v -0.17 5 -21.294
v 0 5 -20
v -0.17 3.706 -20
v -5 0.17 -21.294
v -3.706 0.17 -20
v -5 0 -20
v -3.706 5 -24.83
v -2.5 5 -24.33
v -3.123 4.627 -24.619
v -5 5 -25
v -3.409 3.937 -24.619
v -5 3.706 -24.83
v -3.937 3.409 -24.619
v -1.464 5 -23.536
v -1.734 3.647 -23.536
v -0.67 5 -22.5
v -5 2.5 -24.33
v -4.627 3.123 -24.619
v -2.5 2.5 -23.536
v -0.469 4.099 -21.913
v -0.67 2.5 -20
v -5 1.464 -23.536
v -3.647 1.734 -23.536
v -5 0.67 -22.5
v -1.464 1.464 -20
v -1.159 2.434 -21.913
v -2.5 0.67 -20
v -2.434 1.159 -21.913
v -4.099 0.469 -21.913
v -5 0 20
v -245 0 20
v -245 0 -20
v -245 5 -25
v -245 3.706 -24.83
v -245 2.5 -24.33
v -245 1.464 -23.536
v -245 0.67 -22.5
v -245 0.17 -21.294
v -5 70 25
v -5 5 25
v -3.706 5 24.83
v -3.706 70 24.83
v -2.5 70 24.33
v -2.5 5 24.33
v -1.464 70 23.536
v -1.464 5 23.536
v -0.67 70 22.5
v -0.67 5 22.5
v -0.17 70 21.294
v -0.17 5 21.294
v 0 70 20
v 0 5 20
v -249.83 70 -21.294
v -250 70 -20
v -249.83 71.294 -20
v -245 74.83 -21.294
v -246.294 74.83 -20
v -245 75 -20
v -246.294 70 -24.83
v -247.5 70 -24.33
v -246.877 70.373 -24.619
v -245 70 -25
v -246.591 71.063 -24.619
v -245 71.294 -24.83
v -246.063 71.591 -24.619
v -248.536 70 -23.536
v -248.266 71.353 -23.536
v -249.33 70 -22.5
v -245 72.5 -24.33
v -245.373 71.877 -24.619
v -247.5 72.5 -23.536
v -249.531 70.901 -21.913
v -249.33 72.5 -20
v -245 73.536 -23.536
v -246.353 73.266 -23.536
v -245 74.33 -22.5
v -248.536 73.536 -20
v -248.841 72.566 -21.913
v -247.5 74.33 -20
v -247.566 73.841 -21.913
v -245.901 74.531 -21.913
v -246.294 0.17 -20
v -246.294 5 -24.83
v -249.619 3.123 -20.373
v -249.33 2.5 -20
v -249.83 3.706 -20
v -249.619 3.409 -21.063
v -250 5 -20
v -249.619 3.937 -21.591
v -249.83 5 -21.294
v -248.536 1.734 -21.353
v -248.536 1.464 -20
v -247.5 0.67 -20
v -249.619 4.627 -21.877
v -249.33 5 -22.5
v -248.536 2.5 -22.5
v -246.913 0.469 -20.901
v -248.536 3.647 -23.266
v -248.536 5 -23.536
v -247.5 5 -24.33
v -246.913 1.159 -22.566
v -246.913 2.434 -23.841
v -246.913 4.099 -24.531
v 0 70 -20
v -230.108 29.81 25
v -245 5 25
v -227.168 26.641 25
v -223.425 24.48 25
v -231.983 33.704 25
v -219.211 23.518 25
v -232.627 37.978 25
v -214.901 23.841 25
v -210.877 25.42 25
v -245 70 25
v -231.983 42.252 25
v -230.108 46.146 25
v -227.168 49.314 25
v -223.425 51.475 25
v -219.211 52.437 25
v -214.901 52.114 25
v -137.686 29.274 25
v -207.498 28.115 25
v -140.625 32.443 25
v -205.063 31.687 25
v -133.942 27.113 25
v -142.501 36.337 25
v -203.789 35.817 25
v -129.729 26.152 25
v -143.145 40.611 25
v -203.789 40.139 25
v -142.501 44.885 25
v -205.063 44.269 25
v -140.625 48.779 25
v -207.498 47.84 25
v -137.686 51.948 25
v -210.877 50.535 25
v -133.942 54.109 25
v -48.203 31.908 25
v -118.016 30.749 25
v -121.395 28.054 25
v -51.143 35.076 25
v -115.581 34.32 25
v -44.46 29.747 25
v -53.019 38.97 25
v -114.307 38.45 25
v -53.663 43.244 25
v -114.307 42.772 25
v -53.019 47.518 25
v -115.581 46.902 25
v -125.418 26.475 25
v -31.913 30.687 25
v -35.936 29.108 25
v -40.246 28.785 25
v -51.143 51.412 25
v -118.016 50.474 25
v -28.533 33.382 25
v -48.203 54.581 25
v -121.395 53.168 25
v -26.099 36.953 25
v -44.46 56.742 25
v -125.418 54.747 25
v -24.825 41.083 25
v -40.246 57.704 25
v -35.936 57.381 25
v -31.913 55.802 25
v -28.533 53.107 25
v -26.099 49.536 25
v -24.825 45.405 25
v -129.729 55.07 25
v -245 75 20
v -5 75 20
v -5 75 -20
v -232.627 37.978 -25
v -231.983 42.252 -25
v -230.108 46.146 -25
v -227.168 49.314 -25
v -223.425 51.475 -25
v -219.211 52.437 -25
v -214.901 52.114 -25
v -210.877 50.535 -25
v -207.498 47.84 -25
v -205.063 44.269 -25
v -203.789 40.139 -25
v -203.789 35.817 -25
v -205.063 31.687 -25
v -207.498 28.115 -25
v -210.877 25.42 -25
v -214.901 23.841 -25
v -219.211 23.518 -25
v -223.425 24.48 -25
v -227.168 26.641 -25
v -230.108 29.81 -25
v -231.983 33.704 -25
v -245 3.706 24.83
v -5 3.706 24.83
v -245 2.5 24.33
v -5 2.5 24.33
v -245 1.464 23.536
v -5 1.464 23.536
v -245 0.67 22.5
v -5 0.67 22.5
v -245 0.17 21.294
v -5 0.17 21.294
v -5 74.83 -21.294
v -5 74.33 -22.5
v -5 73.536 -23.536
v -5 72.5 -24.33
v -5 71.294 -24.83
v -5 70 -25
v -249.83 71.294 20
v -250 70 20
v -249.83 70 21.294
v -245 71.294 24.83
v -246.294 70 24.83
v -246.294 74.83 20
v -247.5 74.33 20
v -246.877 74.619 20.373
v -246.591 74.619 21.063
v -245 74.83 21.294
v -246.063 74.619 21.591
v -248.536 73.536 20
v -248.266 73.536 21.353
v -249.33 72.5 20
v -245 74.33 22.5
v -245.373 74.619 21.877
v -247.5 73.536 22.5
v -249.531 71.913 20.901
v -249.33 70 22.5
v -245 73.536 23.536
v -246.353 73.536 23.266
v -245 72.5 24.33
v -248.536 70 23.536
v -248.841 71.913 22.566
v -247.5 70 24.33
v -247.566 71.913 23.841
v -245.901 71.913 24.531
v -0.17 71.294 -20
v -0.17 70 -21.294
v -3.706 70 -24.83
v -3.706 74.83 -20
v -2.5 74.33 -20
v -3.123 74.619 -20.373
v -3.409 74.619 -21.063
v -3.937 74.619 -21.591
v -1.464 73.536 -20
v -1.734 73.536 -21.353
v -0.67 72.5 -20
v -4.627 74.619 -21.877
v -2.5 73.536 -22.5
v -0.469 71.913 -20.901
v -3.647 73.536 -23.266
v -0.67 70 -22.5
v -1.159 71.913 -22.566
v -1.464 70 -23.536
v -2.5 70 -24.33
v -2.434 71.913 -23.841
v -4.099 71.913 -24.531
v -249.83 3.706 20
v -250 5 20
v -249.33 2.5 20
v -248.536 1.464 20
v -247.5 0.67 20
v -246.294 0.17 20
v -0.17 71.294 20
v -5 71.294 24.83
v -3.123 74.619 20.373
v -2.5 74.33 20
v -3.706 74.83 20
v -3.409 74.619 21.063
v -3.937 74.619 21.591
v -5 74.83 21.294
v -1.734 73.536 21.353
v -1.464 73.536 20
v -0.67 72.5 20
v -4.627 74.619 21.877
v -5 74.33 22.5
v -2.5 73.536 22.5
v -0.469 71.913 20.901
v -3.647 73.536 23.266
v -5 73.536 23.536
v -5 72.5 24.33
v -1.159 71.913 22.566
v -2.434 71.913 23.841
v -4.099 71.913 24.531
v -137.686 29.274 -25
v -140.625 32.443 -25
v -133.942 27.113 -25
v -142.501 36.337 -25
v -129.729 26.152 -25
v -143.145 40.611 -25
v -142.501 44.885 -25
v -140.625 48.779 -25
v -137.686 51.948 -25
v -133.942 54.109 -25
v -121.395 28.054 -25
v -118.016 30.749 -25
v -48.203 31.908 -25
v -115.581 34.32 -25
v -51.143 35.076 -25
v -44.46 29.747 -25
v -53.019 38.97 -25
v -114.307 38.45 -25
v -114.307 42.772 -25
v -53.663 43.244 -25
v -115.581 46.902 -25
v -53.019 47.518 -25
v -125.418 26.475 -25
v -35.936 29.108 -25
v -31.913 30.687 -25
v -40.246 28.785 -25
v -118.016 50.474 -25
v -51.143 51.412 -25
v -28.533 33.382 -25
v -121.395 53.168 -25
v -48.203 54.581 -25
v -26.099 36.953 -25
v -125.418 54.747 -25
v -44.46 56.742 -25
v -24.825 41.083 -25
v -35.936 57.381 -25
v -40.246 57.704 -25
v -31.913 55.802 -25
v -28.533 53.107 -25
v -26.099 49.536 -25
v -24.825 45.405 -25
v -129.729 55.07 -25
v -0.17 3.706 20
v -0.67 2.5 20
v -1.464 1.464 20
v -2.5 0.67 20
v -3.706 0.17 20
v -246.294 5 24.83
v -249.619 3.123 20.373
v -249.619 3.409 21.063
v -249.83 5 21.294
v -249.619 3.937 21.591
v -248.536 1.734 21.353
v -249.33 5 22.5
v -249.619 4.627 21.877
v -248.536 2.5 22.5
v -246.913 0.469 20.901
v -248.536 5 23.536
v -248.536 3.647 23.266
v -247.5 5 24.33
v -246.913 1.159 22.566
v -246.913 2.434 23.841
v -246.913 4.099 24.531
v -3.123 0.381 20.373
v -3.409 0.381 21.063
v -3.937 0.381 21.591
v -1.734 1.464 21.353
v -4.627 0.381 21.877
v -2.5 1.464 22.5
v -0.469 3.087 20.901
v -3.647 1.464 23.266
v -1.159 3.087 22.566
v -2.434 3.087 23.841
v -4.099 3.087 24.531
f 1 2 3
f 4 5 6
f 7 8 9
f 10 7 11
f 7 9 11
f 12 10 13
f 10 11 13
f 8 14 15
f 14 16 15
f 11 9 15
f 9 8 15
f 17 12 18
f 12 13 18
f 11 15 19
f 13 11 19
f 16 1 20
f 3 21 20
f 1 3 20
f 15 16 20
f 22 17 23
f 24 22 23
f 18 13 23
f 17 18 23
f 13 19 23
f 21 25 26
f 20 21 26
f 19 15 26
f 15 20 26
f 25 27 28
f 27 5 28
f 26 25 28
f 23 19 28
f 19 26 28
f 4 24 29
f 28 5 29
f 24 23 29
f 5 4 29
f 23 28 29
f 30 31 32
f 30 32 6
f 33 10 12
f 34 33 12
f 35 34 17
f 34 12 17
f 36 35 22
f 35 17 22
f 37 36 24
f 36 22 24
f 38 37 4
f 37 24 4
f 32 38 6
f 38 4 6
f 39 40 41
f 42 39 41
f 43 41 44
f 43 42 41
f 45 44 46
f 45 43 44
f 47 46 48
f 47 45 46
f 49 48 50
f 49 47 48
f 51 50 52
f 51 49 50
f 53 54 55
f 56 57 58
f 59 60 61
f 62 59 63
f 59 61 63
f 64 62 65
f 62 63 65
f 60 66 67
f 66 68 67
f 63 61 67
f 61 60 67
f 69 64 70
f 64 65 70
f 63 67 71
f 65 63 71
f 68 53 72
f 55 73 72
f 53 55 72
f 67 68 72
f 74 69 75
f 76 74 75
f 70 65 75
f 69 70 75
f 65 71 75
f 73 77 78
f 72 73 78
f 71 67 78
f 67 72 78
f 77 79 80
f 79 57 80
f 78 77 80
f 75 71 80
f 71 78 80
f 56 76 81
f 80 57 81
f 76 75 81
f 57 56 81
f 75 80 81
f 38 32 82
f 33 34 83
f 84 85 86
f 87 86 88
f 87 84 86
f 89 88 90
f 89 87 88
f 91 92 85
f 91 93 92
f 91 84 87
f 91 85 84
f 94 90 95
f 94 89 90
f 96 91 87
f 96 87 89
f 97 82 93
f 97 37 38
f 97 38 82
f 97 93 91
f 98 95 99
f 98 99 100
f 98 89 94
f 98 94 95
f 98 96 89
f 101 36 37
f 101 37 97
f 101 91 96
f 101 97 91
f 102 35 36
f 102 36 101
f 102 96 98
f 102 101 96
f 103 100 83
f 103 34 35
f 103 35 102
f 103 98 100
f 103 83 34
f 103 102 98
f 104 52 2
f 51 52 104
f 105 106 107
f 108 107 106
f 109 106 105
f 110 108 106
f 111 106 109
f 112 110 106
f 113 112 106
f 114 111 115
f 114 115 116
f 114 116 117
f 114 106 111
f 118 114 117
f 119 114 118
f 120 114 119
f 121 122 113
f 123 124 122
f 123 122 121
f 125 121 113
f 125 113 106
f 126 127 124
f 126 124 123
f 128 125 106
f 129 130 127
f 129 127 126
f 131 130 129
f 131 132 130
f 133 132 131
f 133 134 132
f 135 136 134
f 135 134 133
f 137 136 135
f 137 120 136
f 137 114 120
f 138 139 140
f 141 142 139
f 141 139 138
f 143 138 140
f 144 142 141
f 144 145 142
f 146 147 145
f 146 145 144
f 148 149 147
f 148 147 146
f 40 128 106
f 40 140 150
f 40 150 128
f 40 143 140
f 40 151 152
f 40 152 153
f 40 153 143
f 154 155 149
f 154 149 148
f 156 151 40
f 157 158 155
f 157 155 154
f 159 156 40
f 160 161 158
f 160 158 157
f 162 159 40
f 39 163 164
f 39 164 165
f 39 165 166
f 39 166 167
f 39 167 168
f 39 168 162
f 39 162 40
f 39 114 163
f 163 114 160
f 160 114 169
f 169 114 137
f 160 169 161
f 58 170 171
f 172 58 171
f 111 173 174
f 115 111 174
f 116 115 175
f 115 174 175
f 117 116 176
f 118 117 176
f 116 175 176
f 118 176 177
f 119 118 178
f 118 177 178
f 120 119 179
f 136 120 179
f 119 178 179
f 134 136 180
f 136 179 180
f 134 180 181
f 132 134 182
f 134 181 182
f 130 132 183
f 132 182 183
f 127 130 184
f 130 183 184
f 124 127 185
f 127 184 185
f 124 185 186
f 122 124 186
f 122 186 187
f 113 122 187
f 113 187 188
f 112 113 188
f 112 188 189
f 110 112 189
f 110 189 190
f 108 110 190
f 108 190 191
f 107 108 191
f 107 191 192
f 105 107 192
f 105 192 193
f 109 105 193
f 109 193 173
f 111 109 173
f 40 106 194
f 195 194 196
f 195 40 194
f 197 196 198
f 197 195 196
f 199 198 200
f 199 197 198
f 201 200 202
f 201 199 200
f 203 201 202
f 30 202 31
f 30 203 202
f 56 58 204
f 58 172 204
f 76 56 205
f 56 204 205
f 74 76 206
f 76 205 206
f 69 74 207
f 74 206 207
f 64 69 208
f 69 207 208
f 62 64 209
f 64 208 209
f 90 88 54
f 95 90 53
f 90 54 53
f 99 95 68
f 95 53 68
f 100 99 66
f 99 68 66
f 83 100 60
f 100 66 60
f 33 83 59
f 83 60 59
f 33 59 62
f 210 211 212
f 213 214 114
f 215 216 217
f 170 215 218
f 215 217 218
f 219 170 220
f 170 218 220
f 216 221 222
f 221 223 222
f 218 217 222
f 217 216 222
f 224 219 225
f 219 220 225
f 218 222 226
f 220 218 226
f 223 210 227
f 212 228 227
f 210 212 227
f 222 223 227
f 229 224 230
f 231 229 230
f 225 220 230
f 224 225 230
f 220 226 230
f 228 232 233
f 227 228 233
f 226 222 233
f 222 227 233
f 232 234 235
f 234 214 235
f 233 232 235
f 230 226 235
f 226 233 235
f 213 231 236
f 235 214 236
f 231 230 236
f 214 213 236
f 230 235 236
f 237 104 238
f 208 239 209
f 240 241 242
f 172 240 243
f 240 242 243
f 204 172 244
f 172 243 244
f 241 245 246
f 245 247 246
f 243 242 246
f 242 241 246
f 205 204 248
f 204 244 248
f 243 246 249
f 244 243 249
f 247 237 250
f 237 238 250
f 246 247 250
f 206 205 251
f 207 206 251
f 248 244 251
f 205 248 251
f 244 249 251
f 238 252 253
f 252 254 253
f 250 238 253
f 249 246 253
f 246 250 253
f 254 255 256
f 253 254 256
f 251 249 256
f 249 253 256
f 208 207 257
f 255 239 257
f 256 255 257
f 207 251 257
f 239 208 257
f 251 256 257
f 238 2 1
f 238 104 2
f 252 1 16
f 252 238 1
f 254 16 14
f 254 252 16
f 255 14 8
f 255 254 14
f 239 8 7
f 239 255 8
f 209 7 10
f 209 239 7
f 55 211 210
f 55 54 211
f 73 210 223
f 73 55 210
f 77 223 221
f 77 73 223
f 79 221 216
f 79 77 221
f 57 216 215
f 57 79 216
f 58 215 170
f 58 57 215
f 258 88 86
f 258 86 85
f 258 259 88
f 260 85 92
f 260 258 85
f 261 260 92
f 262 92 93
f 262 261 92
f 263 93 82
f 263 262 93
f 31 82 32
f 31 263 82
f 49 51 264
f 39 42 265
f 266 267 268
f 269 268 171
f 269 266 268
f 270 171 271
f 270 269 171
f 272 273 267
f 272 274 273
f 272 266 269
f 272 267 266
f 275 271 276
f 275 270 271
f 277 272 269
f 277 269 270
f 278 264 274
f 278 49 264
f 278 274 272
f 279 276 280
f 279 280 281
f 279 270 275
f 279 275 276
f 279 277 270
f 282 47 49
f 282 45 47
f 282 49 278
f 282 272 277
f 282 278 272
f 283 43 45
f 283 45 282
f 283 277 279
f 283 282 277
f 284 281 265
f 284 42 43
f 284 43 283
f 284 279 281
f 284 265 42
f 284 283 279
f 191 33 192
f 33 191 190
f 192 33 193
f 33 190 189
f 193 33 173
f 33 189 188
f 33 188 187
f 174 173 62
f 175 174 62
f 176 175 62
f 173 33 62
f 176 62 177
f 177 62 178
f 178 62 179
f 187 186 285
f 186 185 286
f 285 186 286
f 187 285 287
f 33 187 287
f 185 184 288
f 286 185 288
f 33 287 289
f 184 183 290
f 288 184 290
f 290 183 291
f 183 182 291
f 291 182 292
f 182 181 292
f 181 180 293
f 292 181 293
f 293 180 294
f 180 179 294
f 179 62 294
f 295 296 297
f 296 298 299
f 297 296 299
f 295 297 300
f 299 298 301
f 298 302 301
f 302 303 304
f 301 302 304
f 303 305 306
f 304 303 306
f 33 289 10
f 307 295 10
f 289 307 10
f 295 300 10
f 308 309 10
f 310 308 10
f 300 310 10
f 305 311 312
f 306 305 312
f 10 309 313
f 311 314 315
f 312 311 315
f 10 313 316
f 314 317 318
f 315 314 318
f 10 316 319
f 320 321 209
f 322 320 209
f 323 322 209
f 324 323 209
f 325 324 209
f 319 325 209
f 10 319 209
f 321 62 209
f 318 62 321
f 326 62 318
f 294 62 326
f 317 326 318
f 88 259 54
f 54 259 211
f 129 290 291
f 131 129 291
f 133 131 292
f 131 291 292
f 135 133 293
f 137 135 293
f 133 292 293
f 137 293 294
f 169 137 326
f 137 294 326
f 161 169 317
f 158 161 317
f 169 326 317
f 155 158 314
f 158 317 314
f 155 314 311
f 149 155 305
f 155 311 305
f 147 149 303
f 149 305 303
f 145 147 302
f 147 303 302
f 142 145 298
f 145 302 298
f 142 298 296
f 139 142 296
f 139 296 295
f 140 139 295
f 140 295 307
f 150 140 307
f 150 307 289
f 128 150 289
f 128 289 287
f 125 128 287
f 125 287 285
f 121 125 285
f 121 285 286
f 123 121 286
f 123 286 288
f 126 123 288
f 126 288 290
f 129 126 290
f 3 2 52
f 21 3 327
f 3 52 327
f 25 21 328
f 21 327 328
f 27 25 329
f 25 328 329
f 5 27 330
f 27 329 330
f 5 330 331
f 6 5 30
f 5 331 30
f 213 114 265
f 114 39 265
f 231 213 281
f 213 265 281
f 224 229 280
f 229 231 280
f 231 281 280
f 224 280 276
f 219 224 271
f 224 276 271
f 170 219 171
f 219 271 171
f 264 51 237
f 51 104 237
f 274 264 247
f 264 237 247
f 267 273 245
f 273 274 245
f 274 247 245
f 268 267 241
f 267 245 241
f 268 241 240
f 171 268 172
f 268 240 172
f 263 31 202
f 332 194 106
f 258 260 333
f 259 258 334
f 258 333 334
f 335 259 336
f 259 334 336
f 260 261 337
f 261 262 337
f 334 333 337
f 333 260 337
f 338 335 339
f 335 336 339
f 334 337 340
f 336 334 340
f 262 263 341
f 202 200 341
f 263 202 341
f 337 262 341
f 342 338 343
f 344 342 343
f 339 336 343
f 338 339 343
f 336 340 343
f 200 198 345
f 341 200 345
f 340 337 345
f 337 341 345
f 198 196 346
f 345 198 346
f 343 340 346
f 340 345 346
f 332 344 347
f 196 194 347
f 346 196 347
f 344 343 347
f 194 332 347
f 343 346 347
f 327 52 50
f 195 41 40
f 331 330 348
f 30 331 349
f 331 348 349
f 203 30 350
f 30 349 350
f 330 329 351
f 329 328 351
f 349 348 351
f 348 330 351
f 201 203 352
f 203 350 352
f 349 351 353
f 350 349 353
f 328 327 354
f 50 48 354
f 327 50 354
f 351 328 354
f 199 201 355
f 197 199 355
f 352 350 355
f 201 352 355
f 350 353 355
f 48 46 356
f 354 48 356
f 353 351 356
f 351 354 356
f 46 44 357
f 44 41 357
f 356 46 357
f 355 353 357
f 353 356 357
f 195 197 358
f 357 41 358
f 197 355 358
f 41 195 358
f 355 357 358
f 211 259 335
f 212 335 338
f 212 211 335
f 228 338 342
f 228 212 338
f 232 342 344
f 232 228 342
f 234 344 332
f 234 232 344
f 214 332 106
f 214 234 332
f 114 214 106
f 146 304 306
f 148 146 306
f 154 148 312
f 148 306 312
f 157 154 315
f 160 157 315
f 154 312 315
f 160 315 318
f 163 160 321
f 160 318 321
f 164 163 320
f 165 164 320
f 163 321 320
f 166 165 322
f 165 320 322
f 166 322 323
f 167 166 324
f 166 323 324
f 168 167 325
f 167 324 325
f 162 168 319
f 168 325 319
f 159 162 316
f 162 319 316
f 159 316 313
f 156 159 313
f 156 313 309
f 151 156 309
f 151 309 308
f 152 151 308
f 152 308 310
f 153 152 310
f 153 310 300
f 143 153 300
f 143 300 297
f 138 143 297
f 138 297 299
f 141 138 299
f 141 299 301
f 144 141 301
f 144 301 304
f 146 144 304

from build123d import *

# Parameters (mm, degrees)
F0_W     = 250
F0_H     = 75
F1_DEPTH = 25
F2_R     = 5
F4_D     = 29
F5_D     = 29
F6_D     = 29


with BuildPart() as f1:
    # F0 (on Top) → F1 (new body, symmetric)
    with BuildSketch(Plane.XY):
        with Locations((-125, 37.5)):
            Rectangle(F0_W, F0_H)
    extrude(amount=F1_DEPTH, both=True)

    # F2
    f2_edges = [f1.edges().sort_by_distance(p)[0] for p in [
        (0, 37.5, 25),
        (0, 0, 0),
        (0, 37.5, -25),
        (0, 75, 0),
        (-125, 0, -25),
        (-125, 0, 25),
        (-250, 0, 0),
        (-250, 37.5, 25),
        (-250, 75, 0),
        (-250, 37.5, -25),
        (-125, 75, -25),
        (-125, 75, 25),
    ]]
    fillet(f2_edges, radius=F2_R)

    # F4 (through all)
    with Locations(Plane.XY.offset(25)):
        with Locations((-128.644977, 40.611042)):
            Hole(F4_D / 2)

    # F5 (through all)
    with Locations(Plane.XY.offset(25)):
        with Locations((-39.162696, 43.24426)):
            Hole(F5_D / 2)

    # F6 (through all)
    with Locations(Plane.XY.offset(25)):
        with Locations((-218.127259, 37.977825)):
            Hole(F6_D / 2)


solid = f1.part
